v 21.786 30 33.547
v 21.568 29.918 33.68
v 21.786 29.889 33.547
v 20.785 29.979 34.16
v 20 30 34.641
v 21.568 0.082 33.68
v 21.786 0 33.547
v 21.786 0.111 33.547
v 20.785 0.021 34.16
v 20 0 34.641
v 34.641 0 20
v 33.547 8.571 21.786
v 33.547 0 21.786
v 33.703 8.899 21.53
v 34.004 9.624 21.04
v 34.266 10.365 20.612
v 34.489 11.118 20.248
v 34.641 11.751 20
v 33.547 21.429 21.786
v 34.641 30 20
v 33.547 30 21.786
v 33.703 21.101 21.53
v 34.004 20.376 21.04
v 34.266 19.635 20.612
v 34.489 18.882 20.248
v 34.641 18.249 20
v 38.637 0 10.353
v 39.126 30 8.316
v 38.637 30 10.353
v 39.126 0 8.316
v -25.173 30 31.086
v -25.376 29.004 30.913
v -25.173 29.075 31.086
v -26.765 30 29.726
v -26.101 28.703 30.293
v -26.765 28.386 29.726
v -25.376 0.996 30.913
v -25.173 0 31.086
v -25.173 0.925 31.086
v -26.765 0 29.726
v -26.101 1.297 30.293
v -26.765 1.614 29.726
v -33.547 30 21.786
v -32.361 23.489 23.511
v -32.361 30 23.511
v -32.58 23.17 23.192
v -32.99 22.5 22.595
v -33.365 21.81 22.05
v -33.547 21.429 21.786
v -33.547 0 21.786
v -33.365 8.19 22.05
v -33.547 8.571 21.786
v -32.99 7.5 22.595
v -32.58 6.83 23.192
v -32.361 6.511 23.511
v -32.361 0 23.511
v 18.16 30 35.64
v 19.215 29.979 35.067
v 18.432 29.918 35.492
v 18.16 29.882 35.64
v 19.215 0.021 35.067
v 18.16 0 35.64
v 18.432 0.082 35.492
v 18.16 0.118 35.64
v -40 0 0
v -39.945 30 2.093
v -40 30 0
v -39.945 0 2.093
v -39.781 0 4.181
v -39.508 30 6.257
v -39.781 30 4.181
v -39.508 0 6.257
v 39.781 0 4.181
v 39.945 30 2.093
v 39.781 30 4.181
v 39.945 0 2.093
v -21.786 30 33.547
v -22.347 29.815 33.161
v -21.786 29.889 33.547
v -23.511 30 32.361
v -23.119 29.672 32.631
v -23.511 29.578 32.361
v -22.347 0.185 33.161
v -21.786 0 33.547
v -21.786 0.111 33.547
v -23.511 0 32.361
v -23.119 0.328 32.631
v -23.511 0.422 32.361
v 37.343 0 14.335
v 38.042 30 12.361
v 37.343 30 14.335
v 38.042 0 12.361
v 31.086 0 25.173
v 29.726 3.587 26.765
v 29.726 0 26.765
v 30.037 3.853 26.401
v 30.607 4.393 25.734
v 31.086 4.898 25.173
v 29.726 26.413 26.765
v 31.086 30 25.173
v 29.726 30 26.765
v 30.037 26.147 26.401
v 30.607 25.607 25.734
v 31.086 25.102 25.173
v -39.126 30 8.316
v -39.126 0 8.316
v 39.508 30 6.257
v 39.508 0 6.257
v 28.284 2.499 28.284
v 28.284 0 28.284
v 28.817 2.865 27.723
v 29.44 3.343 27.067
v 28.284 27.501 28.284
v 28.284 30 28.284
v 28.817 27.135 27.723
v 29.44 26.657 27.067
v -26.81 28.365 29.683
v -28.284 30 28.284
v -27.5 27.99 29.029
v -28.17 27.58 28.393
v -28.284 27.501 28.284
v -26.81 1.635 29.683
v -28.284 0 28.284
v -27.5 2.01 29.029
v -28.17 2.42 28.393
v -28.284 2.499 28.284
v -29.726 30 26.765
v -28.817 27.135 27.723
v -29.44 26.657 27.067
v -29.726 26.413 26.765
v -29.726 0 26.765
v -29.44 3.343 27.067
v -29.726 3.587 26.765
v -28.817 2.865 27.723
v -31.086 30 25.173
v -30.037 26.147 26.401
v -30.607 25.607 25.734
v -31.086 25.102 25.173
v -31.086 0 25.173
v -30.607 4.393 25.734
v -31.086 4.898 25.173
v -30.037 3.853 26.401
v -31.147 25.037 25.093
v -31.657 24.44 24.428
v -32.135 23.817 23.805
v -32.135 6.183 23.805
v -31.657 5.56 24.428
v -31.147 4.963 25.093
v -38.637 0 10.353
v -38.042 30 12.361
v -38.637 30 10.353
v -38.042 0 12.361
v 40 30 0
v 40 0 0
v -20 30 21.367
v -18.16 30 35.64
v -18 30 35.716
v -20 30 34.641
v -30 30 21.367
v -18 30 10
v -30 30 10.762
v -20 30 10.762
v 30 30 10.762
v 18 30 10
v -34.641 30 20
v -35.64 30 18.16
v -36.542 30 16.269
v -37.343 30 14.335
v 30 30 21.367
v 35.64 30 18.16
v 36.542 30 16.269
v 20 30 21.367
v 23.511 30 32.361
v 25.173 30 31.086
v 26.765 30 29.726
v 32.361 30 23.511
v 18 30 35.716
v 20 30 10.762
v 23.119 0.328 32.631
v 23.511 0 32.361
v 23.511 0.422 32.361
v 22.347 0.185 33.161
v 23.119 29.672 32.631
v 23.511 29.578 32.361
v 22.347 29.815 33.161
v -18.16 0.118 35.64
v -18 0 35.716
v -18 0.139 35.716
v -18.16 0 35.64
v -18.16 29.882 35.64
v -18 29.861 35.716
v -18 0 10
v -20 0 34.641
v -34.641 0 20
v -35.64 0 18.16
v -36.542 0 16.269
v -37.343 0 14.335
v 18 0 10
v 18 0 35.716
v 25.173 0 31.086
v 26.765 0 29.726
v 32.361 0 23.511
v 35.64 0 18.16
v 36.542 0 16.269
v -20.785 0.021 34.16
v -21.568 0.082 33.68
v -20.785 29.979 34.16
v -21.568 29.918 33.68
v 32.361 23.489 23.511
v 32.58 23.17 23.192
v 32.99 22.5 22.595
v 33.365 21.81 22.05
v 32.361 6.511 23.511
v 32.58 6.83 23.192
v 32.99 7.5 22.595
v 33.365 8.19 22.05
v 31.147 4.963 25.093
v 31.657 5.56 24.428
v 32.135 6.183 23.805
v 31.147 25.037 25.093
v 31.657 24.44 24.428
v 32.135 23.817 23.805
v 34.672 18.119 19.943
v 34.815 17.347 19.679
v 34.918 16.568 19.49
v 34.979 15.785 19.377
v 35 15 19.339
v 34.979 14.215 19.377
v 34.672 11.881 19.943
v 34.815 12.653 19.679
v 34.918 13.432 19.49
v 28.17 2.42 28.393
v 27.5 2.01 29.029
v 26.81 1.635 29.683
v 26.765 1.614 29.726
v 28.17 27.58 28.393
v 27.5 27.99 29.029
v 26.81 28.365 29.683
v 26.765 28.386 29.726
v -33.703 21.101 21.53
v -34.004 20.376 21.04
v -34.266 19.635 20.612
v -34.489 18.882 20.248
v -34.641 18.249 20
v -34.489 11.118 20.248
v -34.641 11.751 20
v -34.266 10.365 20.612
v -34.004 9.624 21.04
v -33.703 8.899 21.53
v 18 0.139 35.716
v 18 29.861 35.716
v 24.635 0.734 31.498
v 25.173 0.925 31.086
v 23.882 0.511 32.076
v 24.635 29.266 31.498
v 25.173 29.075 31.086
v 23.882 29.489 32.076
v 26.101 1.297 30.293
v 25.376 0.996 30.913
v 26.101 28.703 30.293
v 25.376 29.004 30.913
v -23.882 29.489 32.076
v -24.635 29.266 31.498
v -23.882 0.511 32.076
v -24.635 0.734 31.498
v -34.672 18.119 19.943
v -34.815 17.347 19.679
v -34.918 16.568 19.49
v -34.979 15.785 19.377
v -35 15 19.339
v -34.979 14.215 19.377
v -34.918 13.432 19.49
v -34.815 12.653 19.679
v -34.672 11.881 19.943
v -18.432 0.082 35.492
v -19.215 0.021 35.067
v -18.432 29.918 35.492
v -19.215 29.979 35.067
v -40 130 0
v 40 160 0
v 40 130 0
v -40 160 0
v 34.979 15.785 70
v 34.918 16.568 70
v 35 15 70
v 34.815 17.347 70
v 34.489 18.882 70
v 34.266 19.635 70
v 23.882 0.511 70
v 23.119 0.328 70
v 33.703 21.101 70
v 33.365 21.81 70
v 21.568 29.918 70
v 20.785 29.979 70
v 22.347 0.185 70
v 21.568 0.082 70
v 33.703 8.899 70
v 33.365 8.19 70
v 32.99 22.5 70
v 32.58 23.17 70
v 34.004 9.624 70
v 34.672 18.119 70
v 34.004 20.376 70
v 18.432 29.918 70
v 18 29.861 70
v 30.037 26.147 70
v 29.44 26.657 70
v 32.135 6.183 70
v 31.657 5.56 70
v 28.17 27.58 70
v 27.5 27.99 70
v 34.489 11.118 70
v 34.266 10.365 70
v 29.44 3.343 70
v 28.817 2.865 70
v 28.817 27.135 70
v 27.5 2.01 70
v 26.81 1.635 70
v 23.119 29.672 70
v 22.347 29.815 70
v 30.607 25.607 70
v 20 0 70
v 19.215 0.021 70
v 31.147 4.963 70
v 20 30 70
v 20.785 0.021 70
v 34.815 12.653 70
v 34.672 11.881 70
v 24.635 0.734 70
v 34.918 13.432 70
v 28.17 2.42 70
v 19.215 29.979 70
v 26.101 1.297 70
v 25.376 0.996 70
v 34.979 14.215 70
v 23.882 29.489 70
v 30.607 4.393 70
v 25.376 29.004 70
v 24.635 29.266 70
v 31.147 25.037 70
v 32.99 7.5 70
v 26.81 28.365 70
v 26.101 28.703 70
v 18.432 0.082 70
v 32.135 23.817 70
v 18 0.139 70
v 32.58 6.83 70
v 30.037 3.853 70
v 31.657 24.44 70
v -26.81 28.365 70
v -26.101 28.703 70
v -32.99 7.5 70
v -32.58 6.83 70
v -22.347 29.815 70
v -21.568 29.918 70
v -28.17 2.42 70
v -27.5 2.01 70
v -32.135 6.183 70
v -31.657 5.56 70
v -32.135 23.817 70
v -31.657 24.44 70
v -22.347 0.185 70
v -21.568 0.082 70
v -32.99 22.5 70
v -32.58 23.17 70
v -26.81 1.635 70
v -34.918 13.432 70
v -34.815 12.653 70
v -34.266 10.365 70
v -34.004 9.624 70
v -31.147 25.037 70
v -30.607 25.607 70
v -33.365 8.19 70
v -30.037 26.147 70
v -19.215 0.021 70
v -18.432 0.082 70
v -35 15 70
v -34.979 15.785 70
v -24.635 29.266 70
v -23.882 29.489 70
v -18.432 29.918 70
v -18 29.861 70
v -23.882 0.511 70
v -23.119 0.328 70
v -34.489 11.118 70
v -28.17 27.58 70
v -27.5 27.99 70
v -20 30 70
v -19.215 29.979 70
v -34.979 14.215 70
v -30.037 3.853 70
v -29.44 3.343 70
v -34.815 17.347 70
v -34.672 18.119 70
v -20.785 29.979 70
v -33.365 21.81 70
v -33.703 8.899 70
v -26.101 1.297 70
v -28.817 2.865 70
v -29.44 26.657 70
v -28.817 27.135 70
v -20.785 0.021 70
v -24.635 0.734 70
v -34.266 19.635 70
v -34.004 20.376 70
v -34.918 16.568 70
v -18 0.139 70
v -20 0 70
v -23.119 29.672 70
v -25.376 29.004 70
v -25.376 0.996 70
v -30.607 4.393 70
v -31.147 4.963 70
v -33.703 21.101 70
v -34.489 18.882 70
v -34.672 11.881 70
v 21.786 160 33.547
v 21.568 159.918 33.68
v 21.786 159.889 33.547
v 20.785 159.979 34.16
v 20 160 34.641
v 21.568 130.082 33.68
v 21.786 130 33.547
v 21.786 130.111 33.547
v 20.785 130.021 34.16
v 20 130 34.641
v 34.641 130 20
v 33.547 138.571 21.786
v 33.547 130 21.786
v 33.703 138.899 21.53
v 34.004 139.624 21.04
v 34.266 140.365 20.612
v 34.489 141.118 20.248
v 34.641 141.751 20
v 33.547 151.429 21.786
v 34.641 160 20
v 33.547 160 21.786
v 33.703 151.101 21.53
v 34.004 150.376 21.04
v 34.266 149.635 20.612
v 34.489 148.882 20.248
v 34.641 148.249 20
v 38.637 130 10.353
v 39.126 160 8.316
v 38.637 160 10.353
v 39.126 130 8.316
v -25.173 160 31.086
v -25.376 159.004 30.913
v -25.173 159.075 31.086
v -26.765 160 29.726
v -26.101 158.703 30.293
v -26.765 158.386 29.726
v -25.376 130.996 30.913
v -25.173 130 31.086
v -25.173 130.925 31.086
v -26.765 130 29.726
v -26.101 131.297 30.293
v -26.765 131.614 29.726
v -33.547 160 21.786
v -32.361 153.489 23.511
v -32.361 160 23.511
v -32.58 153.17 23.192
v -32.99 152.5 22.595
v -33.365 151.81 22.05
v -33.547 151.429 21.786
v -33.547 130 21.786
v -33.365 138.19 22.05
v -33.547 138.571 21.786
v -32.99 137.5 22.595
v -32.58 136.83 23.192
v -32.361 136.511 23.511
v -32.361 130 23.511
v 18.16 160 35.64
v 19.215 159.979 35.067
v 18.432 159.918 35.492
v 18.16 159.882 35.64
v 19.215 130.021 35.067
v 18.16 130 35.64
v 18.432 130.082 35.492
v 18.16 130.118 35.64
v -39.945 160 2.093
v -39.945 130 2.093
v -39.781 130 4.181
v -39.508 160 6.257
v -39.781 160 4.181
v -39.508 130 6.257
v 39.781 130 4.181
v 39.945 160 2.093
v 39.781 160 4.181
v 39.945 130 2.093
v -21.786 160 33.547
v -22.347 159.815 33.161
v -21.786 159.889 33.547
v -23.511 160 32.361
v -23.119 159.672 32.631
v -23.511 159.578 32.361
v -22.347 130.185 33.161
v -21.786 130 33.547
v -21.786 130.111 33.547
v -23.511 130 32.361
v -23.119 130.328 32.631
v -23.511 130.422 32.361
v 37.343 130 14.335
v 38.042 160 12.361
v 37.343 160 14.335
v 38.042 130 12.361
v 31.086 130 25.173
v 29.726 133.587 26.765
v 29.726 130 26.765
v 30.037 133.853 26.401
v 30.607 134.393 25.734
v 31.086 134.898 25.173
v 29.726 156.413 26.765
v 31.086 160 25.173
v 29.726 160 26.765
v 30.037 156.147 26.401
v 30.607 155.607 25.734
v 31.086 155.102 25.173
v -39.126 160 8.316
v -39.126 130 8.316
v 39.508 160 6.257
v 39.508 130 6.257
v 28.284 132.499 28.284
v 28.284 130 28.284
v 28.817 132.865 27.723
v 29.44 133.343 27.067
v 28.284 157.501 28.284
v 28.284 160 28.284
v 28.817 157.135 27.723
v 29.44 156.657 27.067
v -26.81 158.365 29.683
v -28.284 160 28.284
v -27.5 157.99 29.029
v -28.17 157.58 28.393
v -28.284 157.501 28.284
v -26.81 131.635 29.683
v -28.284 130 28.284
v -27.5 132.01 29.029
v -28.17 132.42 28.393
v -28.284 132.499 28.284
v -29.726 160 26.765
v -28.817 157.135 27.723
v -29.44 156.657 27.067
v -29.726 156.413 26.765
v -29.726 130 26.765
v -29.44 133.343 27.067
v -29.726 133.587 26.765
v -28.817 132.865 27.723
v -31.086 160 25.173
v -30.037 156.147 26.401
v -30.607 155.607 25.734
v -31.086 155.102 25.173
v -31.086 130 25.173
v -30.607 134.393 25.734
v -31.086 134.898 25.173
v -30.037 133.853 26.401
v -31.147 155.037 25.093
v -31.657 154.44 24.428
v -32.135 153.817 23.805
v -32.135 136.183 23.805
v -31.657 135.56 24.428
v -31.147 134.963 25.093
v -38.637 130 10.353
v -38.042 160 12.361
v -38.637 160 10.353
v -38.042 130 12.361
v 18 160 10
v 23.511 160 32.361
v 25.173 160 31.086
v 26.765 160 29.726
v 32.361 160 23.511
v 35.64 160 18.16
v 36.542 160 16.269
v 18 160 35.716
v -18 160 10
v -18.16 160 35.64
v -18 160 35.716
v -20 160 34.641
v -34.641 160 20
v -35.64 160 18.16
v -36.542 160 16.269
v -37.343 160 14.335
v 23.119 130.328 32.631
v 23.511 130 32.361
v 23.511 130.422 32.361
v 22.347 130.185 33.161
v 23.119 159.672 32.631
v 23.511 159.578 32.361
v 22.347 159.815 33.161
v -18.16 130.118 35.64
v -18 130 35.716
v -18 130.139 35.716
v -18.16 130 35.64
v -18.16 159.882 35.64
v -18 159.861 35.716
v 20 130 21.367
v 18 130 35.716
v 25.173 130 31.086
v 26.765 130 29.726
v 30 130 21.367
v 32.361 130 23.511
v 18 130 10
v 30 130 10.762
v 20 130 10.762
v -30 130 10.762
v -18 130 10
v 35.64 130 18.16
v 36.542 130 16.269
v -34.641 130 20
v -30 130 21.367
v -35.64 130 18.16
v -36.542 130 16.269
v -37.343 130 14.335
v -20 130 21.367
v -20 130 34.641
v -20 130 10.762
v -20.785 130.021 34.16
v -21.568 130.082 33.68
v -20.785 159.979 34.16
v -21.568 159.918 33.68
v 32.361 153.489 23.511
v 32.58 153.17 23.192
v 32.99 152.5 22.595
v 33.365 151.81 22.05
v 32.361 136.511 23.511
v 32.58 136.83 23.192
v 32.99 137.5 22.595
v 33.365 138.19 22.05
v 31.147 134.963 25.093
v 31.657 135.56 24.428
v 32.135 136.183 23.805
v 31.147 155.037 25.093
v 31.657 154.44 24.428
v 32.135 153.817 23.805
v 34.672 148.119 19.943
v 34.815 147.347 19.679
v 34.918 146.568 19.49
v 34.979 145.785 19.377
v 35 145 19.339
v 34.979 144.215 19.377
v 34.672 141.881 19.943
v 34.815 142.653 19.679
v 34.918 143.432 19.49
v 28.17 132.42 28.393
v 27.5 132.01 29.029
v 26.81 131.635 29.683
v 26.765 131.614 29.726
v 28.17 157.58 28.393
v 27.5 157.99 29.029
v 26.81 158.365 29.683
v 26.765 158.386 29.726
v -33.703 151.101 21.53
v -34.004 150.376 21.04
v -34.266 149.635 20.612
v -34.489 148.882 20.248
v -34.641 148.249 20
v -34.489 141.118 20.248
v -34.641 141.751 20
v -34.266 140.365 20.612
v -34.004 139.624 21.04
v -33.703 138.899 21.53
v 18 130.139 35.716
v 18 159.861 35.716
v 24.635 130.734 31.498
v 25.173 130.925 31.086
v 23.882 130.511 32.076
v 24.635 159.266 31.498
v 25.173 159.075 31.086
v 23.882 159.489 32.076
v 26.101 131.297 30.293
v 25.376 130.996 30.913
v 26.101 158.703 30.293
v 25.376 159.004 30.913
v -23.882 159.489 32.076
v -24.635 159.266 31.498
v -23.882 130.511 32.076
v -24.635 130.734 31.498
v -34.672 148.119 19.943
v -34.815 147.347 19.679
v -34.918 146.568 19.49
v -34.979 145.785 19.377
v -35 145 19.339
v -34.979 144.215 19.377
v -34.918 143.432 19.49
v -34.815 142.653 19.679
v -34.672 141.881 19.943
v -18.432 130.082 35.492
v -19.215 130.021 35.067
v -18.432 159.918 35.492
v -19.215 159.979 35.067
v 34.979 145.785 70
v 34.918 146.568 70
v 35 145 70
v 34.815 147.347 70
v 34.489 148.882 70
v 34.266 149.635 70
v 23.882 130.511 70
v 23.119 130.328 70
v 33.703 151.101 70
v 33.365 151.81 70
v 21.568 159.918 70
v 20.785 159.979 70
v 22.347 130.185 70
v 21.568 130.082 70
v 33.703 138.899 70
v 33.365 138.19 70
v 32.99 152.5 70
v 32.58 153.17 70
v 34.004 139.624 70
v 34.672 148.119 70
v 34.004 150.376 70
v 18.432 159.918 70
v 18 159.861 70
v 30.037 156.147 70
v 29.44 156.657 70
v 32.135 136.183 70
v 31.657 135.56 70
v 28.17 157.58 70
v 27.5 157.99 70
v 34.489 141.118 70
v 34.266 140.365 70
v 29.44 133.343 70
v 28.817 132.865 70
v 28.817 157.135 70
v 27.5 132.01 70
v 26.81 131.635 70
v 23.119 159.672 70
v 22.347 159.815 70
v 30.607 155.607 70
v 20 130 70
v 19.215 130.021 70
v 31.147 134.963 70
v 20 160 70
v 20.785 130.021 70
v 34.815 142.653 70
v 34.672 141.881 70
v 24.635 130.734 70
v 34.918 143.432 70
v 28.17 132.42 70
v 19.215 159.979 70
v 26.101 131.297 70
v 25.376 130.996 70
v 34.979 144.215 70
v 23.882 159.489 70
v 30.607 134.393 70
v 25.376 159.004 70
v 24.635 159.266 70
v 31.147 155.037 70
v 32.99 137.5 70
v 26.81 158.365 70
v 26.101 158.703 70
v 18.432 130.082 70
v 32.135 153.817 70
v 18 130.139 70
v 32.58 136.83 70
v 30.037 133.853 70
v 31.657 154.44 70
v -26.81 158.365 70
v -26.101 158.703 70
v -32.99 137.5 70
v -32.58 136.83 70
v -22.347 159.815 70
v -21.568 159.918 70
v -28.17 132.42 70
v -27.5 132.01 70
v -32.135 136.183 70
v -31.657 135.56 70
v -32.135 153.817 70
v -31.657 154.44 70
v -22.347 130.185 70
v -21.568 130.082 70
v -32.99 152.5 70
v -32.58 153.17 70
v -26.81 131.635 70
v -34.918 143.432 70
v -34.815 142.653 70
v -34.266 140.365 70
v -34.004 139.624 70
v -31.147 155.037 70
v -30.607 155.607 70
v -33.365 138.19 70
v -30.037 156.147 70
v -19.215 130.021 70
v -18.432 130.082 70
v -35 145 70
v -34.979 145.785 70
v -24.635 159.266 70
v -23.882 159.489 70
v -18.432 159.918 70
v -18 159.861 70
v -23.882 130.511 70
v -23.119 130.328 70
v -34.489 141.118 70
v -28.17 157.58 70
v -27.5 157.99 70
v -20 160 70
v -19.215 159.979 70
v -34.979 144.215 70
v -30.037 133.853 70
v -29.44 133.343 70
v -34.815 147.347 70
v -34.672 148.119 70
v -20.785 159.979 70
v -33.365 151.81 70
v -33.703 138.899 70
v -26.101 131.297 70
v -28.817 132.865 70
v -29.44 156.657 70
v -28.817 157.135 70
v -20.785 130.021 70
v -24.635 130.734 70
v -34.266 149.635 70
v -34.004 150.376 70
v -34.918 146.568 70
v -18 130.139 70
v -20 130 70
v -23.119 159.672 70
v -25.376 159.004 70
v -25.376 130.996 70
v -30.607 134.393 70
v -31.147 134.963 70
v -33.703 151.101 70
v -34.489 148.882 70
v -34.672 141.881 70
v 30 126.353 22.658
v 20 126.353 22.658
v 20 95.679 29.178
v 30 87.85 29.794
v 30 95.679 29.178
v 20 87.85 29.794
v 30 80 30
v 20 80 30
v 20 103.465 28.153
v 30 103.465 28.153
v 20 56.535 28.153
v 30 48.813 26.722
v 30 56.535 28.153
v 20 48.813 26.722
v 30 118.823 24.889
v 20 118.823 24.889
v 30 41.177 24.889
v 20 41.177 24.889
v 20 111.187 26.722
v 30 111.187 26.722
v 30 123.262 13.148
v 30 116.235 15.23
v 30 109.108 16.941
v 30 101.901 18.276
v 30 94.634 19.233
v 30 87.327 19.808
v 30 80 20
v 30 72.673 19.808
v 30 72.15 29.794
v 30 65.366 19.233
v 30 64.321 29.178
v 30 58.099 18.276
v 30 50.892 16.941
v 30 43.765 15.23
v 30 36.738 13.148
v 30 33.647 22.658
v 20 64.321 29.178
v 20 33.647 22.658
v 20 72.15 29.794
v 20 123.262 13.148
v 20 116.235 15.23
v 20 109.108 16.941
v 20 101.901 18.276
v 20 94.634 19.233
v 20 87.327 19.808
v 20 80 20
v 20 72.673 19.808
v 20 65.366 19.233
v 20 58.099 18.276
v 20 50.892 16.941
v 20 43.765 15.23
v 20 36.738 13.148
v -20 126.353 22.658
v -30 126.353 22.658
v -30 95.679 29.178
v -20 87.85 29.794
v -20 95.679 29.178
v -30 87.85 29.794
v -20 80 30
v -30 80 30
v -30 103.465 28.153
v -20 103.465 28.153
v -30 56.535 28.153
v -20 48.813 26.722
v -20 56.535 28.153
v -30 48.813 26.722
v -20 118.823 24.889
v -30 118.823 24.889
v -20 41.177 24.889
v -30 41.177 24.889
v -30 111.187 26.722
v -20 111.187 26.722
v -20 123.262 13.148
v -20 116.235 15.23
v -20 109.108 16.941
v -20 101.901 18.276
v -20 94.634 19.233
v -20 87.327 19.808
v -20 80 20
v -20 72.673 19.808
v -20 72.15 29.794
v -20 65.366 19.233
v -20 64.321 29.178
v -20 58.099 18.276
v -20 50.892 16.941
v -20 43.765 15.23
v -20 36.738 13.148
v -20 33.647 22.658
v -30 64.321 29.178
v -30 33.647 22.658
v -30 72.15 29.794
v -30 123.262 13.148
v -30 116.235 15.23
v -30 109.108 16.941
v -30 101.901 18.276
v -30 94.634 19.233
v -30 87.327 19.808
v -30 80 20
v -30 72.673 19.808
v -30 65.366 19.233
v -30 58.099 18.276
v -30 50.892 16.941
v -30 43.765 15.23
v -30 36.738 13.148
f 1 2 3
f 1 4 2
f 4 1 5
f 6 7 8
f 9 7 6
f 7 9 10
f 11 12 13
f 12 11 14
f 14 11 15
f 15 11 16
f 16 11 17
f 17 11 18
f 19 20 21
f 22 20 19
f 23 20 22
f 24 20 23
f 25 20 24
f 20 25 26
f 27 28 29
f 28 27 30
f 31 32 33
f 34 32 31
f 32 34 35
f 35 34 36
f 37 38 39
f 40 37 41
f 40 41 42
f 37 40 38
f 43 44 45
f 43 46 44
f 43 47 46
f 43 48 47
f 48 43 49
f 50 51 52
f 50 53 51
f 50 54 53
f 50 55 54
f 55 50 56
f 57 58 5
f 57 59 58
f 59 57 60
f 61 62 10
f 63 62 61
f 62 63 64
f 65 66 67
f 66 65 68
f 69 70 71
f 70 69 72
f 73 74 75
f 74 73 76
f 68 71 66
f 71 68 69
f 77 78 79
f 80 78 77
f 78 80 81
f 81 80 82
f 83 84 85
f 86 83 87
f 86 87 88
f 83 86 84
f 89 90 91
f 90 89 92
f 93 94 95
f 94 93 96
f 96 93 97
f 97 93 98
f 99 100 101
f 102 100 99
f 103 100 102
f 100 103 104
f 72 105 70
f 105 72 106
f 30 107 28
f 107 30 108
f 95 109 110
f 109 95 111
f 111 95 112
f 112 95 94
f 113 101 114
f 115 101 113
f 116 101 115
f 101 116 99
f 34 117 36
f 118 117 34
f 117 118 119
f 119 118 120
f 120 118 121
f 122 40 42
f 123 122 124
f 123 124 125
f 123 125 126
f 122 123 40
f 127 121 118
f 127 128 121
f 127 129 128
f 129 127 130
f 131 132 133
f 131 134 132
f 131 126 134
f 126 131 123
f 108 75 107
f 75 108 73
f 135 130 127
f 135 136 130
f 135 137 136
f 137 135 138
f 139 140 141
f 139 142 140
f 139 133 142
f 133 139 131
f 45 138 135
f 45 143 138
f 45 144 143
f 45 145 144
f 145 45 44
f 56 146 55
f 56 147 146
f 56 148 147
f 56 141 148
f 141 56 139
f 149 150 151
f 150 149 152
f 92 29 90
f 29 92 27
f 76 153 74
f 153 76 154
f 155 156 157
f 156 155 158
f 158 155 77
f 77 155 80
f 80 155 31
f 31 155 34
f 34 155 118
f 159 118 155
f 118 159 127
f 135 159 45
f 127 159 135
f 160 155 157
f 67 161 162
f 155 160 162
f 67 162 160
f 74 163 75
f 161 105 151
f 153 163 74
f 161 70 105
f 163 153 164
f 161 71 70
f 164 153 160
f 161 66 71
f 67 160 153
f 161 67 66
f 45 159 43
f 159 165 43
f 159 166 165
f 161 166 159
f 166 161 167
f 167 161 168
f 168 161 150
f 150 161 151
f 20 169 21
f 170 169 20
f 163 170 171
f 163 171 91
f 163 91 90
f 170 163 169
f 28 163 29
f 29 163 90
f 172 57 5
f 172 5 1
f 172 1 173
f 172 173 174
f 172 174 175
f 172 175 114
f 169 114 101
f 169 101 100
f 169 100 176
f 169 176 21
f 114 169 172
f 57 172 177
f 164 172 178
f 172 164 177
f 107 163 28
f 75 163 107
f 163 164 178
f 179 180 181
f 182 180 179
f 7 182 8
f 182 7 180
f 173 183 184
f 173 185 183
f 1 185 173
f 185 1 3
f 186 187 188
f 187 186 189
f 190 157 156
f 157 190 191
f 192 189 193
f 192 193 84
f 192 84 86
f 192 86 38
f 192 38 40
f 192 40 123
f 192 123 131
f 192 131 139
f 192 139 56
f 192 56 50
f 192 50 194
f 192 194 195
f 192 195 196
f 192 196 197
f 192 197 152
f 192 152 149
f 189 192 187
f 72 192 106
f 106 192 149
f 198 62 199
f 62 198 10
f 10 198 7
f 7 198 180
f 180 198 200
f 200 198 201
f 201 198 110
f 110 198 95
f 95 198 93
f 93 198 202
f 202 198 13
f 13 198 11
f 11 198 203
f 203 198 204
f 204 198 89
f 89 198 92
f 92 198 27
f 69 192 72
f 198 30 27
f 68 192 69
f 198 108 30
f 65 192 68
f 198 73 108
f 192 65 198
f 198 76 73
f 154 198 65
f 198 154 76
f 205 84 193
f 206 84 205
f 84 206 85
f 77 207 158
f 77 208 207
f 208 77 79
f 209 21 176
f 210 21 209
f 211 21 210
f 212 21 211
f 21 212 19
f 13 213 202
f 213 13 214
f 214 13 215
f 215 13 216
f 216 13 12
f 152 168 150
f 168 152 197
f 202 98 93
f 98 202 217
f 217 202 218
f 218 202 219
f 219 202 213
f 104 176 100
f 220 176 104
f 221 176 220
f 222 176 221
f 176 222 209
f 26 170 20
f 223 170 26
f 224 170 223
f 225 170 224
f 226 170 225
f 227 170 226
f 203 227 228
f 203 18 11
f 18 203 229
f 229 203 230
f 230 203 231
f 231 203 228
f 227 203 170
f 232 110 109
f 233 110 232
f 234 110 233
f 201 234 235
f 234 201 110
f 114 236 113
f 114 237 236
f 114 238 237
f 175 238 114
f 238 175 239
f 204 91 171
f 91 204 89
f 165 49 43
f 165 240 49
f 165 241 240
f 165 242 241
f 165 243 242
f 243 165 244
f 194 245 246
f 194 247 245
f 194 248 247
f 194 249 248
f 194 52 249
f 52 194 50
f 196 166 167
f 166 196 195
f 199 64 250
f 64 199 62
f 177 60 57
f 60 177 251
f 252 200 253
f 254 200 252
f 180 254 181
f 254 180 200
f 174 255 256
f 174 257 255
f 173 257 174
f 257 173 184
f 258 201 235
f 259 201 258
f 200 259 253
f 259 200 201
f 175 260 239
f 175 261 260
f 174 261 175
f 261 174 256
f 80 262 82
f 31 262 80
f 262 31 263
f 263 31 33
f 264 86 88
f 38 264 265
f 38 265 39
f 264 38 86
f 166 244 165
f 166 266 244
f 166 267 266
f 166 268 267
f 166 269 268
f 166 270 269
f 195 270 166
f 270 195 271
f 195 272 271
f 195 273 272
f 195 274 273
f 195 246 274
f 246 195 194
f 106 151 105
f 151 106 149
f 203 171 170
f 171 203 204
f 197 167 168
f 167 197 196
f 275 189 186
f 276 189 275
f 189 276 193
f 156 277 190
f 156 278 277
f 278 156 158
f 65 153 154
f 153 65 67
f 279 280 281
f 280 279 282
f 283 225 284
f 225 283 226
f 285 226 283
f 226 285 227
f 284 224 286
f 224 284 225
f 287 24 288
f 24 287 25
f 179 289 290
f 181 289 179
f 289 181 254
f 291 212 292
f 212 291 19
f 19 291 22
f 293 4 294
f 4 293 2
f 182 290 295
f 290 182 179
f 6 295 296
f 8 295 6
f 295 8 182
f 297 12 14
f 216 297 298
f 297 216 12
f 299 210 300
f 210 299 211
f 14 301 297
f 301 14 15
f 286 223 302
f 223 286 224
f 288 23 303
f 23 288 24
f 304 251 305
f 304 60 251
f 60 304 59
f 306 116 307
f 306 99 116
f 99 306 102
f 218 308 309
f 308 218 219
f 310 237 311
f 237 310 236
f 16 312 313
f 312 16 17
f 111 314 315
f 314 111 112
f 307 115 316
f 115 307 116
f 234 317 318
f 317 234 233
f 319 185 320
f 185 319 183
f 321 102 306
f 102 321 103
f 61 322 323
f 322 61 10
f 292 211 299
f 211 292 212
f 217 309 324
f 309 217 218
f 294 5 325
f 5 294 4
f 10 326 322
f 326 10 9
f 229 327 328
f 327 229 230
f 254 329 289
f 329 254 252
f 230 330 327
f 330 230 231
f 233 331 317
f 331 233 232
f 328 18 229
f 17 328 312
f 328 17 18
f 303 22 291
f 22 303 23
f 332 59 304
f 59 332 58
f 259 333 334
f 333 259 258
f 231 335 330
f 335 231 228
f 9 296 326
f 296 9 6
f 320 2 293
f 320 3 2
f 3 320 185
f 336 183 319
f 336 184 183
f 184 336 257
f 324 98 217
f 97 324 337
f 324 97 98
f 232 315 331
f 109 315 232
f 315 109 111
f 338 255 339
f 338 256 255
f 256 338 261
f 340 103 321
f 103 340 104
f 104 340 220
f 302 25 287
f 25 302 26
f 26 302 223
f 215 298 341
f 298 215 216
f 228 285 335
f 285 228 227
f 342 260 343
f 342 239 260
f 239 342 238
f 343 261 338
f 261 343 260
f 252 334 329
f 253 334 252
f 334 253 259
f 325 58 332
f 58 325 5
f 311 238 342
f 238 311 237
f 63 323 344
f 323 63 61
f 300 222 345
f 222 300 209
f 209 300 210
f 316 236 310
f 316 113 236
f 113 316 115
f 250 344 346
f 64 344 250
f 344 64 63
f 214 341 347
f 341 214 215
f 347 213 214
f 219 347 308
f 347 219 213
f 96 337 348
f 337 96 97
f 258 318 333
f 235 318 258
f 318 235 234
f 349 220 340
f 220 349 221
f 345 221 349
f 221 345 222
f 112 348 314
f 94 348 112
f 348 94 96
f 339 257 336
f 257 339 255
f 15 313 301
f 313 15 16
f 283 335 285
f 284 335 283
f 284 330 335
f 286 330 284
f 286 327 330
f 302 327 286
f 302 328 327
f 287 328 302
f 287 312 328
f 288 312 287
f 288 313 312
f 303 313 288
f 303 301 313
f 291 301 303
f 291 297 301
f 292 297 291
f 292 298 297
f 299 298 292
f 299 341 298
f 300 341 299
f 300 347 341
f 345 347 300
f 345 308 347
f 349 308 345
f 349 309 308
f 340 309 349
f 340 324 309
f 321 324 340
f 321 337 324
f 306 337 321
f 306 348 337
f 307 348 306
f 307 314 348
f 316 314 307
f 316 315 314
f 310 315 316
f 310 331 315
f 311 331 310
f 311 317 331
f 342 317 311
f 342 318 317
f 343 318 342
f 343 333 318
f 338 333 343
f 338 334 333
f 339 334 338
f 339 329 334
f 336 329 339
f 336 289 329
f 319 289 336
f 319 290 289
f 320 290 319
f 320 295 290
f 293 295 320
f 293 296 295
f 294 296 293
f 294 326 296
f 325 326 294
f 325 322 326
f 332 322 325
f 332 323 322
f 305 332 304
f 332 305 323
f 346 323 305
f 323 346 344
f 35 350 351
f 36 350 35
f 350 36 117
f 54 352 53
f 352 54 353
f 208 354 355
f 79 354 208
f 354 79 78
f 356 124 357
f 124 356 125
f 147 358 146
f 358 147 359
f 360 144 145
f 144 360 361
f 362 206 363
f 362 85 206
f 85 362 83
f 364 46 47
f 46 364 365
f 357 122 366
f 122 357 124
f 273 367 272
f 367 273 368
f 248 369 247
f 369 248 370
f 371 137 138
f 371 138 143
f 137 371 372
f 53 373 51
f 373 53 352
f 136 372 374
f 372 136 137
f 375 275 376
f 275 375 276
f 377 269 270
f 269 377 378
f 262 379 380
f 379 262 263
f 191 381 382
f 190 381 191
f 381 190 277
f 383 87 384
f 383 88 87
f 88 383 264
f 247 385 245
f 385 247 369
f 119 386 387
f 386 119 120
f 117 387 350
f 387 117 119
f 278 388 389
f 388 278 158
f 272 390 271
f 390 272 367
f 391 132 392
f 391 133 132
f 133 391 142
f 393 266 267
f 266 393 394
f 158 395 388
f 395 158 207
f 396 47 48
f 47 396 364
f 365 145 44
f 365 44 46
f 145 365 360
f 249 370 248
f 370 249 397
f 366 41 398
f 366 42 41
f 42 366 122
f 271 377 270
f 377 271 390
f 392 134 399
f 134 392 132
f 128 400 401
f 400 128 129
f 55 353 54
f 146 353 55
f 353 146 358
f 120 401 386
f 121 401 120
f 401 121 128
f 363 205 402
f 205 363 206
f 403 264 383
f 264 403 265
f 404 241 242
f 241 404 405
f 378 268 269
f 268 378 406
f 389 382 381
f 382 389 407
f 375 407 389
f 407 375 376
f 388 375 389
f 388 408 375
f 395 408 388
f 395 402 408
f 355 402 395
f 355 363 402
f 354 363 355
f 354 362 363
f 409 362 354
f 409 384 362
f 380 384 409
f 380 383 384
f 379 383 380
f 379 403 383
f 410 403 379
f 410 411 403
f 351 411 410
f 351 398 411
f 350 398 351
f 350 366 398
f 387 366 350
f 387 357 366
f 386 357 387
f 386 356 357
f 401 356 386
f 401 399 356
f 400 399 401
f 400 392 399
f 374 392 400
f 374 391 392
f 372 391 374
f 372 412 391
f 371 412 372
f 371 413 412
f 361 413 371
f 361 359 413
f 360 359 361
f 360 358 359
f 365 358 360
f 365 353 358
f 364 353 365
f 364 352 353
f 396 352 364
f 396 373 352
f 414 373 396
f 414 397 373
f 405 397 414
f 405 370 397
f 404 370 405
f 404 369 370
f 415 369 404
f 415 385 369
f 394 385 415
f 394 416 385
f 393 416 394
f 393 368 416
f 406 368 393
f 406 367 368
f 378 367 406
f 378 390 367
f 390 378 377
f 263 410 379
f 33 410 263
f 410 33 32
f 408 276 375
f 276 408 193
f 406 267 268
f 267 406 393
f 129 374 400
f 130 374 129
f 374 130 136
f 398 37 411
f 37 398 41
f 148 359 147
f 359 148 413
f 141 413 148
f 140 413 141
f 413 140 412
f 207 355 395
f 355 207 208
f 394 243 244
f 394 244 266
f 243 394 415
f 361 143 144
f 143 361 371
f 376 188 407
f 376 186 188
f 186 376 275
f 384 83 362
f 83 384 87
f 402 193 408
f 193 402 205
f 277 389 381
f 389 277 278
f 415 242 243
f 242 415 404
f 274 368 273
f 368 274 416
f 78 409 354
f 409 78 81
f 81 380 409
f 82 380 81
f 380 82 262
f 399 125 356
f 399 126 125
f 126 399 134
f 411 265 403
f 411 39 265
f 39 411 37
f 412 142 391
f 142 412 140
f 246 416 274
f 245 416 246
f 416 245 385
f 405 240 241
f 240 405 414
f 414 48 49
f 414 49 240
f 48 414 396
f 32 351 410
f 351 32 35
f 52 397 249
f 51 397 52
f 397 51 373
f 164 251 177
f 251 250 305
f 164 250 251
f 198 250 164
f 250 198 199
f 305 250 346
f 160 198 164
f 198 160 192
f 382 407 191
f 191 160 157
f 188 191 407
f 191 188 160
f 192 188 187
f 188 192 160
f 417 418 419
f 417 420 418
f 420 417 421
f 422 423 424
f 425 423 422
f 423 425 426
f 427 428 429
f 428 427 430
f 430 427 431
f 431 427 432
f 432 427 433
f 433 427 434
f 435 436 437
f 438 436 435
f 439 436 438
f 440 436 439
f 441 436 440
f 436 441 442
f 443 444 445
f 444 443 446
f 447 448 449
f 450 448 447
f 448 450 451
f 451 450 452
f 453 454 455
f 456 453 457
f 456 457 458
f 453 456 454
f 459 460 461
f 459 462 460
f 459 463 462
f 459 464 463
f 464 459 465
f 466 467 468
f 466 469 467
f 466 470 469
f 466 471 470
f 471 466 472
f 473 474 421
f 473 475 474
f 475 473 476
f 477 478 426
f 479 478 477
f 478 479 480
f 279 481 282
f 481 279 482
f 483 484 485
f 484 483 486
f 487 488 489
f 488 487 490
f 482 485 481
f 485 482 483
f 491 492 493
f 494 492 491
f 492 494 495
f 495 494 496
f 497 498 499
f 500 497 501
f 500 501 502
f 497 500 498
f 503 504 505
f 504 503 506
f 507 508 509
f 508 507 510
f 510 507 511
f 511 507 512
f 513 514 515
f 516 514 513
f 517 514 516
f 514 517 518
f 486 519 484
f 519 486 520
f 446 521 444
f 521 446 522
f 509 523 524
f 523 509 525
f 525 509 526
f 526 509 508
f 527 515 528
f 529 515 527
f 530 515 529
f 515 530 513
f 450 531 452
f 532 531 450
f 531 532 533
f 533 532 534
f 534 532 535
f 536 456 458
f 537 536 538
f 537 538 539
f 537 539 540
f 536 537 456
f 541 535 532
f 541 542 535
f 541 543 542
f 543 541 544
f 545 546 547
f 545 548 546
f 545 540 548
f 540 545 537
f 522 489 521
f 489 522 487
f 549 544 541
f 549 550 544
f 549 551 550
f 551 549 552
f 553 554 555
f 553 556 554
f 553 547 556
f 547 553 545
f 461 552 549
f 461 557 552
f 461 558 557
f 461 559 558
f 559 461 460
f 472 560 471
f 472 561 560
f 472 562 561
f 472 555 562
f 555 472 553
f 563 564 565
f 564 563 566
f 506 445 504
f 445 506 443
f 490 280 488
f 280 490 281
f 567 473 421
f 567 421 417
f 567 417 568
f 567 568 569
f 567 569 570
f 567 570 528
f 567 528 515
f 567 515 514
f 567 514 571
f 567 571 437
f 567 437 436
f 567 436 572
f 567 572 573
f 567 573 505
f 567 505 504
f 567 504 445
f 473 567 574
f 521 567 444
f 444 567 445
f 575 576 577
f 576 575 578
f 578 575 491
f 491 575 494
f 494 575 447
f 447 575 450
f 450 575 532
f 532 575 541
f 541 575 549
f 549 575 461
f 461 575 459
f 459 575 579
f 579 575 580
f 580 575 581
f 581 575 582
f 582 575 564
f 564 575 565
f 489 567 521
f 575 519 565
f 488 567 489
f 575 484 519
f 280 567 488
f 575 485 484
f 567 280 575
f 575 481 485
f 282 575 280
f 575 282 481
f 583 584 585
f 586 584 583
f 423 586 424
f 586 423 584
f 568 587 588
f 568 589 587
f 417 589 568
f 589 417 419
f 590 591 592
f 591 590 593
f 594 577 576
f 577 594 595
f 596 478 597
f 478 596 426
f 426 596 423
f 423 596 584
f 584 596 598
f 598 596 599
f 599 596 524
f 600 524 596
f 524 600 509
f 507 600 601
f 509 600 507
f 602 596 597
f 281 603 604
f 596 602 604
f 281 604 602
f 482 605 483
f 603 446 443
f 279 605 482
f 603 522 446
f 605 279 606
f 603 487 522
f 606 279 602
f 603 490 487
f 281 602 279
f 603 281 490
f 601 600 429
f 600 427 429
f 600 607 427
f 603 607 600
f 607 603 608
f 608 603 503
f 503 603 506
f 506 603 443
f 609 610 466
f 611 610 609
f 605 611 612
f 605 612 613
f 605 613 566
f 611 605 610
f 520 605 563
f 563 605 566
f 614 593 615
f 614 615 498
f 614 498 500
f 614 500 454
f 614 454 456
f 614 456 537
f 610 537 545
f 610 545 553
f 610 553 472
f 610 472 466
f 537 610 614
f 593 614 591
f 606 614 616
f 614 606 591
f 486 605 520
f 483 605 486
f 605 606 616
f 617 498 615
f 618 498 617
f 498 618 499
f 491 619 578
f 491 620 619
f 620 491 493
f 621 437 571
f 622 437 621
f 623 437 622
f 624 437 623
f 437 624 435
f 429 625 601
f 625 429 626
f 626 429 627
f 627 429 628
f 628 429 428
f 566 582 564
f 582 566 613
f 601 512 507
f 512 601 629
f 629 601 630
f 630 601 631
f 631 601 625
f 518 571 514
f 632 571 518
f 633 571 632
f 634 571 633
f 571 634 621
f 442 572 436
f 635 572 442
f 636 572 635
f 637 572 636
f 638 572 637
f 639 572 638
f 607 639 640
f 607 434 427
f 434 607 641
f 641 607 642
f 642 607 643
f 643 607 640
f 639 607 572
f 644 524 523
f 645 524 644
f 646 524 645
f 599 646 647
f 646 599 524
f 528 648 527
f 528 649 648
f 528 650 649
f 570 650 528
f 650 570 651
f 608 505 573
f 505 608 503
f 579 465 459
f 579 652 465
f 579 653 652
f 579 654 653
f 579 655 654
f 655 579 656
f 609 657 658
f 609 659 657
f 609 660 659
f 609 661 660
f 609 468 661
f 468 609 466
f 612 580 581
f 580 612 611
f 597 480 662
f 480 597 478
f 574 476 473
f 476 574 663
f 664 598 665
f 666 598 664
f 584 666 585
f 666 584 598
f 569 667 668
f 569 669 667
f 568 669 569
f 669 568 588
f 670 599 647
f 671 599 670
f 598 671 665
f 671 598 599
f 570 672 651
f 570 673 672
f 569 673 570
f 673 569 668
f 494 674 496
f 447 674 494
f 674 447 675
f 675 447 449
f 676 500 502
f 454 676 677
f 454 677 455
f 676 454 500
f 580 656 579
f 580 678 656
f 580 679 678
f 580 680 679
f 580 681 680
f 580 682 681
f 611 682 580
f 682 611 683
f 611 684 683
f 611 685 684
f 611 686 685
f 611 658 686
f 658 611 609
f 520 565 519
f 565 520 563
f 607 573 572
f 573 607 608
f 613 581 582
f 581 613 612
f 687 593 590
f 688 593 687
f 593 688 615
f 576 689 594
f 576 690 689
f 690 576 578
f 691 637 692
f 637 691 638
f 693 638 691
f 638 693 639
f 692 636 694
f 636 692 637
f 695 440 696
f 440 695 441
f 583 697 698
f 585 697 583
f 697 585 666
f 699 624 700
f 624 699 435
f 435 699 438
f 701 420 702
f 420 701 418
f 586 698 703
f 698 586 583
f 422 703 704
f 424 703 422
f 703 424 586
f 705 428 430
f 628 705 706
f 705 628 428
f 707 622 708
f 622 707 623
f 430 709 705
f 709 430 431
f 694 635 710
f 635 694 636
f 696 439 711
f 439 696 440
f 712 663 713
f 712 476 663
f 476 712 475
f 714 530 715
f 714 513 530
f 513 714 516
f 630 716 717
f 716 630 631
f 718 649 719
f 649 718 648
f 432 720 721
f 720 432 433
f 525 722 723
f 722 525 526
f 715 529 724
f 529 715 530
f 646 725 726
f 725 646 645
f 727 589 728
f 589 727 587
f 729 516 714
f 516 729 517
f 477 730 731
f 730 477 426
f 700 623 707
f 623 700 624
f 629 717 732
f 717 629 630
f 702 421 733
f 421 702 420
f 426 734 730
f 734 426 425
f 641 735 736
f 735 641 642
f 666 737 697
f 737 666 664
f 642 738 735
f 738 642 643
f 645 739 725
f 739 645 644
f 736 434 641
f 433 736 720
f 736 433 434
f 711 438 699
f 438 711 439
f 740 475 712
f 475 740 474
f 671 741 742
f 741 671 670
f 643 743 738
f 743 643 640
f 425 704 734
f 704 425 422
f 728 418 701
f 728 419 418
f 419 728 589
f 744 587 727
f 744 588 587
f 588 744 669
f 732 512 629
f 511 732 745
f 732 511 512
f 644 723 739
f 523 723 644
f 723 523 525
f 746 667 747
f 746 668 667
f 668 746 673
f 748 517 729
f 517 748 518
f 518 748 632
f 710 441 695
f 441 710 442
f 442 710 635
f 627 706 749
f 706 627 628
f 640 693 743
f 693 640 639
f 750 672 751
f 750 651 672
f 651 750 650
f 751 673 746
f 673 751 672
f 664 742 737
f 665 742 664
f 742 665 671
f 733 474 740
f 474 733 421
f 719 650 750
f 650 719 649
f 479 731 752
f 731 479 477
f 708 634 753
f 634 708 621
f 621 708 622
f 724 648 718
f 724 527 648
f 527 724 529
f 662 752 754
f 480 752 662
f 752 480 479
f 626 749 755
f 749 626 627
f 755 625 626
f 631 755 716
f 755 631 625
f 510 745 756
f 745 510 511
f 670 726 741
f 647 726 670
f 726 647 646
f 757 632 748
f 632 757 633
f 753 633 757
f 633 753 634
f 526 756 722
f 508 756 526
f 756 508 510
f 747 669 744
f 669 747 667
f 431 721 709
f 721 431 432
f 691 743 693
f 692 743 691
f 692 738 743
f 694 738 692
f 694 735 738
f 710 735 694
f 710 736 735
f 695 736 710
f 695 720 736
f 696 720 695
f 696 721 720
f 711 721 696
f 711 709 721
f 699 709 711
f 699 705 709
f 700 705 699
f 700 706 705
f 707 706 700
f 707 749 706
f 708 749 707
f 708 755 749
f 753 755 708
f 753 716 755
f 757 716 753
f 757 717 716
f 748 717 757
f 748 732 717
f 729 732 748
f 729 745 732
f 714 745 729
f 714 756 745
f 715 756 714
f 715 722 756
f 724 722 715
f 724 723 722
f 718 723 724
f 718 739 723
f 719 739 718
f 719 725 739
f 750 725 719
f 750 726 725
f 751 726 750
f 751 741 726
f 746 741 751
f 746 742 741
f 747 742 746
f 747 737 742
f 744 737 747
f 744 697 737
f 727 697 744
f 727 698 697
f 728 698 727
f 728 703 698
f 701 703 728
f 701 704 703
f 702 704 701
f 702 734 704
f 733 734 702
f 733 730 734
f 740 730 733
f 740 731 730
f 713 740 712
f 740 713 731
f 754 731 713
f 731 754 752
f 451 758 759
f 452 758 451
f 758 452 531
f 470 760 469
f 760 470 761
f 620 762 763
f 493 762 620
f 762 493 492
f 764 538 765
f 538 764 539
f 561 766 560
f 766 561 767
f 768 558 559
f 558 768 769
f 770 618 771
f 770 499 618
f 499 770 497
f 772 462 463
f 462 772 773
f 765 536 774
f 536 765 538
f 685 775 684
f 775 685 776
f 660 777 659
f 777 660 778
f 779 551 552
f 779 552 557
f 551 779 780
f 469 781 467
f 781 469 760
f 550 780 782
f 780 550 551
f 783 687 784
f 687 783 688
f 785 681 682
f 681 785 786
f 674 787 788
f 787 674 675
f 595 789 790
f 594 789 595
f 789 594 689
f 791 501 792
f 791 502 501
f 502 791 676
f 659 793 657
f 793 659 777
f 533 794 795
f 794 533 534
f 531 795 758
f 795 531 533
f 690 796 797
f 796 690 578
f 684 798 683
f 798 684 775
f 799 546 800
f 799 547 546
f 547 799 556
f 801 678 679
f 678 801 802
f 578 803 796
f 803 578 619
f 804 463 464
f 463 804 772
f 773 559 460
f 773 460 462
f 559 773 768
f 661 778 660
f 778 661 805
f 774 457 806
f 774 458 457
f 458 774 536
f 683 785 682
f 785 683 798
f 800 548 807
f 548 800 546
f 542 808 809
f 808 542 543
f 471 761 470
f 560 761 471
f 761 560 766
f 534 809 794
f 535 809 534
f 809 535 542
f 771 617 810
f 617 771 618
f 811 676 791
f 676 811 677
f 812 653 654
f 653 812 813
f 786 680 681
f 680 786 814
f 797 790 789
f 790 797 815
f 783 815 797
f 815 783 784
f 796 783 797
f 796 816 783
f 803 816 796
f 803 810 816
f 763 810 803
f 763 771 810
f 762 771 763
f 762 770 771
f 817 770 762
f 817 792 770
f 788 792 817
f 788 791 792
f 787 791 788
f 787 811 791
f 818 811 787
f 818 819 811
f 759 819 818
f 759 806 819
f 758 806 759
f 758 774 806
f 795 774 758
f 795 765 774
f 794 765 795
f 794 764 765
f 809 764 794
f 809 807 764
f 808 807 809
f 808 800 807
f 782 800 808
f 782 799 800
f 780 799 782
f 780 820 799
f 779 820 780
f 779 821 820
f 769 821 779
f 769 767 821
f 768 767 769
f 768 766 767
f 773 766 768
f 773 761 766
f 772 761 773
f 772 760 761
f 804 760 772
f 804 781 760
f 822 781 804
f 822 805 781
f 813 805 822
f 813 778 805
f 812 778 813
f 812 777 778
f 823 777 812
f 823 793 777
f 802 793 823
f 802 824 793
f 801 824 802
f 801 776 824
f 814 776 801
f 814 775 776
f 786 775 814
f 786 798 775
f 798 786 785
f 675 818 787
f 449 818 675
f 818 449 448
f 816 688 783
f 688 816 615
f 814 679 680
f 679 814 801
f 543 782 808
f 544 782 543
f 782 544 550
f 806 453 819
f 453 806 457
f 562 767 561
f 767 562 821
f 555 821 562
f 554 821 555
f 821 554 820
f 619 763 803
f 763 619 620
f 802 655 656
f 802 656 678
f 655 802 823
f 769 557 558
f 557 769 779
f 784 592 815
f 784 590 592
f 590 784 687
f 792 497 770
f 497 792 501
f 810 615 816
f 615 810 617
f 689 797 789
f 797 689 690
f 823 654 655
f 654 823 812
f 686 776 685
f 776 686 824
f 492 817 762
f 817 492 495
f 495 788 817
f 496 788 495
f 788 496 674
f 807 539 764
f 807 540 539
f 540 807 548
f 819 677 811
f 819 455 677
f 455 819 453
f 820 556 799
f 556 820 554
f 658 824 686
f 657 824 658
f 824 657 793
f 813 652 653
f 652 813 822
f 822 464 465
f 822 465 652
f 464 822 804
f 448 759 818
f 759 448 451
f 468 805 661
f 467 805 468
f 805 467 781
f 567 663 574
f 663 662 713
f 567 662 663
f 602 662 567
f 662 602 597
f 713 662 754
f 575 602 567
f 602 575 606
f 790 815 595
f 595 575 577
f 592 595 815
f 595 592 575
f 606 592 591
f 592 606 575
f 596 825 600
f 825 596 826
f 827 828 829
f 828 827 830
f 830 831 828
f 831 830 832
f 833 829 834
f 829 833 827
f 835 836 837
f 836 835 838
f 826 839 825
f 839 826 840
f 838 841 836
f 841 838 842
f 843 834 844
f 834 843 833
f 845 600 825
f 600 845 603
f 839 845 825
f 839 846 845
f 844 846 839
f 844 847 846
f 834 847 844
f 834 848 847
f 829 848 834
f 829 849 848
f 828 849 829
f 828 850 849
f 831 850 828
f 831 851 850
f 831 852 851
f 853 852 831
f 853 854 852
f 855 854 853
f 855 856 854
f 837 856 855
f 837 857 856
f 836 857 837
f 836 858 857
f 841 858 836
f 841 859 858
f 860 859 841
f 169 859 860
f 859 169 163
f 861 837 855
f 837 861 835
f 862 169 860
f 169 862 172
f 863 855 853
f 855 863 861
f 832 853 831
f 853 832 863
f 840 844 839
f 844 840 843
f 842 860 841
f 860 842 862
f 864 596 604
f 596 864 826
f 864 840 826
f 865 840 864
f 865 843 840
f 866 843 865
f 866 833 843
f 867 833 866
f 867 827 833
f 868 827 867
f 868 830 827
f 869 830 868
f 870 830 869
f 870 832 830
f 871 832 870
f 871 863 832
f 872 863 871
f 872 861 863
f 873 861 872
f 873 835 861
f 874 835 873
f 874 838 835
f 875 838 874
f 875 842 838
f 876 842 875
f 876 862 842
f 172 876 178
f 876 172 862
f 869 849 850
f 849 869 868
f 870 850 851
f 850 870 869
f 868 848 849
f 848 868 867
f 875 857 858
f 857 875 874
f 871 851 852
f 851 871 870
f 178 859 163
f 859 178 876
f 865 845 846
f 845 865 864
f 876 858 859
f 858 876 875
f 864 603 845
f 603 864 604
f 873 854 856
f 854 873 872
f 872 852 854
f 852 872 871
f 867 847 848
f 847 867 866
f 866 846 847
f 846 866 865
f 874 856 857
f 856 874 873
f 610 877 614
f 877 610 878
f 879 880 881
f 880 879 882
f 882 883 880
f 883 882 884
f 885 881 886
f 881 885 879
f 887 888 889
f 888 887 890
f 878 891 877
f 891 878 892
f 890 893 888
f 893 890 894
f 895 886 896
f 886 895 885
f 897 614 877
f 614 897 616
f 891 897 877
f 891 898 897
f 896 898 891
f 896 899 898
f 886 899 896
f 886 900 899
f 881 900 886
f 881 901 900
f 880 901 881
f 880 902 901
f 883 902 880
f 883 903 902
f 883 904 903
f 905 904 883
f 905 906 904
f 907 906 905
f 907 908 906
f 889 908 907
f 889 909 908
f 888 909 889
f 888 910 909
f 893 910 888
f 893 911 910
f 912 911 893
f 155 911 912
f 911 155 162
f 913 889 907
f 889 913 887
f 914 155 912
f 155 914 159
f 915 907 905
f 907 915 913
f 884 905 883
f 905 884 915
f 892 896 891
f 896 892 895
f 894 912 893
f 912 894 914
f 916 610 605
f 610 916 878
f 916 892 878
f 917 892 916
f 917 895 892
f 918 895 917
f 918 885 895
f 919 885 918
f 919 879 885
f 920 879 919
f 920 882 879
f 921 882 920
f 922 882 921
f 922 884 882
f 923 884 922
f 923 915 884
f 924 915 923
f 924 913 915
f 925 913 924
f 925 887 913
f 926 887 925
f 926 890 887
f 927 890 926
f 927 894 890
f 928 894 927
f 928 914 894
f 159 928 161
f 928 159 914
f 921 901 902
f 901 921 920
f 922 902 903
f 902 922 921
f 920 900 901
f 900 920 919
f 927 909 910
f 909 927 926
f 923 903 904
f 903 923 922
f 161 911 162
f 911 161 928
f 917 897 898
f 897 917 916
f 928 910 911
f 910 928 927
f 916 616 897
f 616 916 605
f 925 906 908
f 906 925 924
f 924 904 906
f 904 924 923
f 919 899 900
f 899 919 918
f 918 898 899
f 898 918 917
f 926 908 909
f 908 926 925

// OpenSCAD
/*

    lenovo tiny m700 standfuß

    doppelmitbogen(): zwei Füße mit Verbindungsbogen
                                 längere Druckzeit!   
                                 30% Füllung, Treesupport, 0,2 mm Schichtdicke
                                 --> 12 Stunden

    einzelfuss(): nur ein Fuß, zwei Mal drucken
                       --> 4 1/2 Stunden/Stück

*/

$fn = $preview ? 20 : 120; // hier ändern für schnelleres Rendern

fussbreite = 30.0;
fussabstand = 160;          // Aussenmaß

standbreite = 30.0;
standhoehe = 70.0;
standofs = 20.0;

// tiny
tinyb = 36.0;
tinyh = 185.0;
tinyl = 180.0;

//color("black") translate([-tinyb/2.0,0,10]) cube([tinyb,tinyh,tinyl]);

doppelmitbogen();

module einzelfuss() { 
    difference() {
        union() {
            intersection() {
                union() {
                    rotate([-90,0,0]) cylinder(h=fussbreite,d=80);
                }
                union() {
                    translate([-50,-50,0]) cube([500,500,200]);
                }
            }
            translate([standofs,standbreite/2.0,0]) cylinder(d=standbreite,h=standhoehe);
            translate([-standofs,standbreite/2.0,0]) cylinder(d=standbreite,h=standhoehe);
        }
        union() {
            color("black") translate([-tinyb/2.0,0,10]) cube([tinyb,tinyh,tinyl]);
        }
    }
}

module doppelmitbogen() {
    intersection() {
        union() {
            einzelfuss();
            translate([0,fussabstand-standbreite,0]) einzelfuss();

            translate([30,fussabstand/2.0,-120]) rotate([0,-90,0])
            difference() {
              cylinder(d=300,h=10);
              cylinder(d=280,h=10);
            }

            translate([-20,fussabstand/2.0,-120]) rotate([0,-90,0])
            difference() {
                  cylinder(d=300,h=10);
                  cylinder(d=280,h=10);
            }
        }
        union() {
            translate([-fussbreite*4,0,0]) cube([fussbreite*8,fussabstand,200]);
        }
    }
}
